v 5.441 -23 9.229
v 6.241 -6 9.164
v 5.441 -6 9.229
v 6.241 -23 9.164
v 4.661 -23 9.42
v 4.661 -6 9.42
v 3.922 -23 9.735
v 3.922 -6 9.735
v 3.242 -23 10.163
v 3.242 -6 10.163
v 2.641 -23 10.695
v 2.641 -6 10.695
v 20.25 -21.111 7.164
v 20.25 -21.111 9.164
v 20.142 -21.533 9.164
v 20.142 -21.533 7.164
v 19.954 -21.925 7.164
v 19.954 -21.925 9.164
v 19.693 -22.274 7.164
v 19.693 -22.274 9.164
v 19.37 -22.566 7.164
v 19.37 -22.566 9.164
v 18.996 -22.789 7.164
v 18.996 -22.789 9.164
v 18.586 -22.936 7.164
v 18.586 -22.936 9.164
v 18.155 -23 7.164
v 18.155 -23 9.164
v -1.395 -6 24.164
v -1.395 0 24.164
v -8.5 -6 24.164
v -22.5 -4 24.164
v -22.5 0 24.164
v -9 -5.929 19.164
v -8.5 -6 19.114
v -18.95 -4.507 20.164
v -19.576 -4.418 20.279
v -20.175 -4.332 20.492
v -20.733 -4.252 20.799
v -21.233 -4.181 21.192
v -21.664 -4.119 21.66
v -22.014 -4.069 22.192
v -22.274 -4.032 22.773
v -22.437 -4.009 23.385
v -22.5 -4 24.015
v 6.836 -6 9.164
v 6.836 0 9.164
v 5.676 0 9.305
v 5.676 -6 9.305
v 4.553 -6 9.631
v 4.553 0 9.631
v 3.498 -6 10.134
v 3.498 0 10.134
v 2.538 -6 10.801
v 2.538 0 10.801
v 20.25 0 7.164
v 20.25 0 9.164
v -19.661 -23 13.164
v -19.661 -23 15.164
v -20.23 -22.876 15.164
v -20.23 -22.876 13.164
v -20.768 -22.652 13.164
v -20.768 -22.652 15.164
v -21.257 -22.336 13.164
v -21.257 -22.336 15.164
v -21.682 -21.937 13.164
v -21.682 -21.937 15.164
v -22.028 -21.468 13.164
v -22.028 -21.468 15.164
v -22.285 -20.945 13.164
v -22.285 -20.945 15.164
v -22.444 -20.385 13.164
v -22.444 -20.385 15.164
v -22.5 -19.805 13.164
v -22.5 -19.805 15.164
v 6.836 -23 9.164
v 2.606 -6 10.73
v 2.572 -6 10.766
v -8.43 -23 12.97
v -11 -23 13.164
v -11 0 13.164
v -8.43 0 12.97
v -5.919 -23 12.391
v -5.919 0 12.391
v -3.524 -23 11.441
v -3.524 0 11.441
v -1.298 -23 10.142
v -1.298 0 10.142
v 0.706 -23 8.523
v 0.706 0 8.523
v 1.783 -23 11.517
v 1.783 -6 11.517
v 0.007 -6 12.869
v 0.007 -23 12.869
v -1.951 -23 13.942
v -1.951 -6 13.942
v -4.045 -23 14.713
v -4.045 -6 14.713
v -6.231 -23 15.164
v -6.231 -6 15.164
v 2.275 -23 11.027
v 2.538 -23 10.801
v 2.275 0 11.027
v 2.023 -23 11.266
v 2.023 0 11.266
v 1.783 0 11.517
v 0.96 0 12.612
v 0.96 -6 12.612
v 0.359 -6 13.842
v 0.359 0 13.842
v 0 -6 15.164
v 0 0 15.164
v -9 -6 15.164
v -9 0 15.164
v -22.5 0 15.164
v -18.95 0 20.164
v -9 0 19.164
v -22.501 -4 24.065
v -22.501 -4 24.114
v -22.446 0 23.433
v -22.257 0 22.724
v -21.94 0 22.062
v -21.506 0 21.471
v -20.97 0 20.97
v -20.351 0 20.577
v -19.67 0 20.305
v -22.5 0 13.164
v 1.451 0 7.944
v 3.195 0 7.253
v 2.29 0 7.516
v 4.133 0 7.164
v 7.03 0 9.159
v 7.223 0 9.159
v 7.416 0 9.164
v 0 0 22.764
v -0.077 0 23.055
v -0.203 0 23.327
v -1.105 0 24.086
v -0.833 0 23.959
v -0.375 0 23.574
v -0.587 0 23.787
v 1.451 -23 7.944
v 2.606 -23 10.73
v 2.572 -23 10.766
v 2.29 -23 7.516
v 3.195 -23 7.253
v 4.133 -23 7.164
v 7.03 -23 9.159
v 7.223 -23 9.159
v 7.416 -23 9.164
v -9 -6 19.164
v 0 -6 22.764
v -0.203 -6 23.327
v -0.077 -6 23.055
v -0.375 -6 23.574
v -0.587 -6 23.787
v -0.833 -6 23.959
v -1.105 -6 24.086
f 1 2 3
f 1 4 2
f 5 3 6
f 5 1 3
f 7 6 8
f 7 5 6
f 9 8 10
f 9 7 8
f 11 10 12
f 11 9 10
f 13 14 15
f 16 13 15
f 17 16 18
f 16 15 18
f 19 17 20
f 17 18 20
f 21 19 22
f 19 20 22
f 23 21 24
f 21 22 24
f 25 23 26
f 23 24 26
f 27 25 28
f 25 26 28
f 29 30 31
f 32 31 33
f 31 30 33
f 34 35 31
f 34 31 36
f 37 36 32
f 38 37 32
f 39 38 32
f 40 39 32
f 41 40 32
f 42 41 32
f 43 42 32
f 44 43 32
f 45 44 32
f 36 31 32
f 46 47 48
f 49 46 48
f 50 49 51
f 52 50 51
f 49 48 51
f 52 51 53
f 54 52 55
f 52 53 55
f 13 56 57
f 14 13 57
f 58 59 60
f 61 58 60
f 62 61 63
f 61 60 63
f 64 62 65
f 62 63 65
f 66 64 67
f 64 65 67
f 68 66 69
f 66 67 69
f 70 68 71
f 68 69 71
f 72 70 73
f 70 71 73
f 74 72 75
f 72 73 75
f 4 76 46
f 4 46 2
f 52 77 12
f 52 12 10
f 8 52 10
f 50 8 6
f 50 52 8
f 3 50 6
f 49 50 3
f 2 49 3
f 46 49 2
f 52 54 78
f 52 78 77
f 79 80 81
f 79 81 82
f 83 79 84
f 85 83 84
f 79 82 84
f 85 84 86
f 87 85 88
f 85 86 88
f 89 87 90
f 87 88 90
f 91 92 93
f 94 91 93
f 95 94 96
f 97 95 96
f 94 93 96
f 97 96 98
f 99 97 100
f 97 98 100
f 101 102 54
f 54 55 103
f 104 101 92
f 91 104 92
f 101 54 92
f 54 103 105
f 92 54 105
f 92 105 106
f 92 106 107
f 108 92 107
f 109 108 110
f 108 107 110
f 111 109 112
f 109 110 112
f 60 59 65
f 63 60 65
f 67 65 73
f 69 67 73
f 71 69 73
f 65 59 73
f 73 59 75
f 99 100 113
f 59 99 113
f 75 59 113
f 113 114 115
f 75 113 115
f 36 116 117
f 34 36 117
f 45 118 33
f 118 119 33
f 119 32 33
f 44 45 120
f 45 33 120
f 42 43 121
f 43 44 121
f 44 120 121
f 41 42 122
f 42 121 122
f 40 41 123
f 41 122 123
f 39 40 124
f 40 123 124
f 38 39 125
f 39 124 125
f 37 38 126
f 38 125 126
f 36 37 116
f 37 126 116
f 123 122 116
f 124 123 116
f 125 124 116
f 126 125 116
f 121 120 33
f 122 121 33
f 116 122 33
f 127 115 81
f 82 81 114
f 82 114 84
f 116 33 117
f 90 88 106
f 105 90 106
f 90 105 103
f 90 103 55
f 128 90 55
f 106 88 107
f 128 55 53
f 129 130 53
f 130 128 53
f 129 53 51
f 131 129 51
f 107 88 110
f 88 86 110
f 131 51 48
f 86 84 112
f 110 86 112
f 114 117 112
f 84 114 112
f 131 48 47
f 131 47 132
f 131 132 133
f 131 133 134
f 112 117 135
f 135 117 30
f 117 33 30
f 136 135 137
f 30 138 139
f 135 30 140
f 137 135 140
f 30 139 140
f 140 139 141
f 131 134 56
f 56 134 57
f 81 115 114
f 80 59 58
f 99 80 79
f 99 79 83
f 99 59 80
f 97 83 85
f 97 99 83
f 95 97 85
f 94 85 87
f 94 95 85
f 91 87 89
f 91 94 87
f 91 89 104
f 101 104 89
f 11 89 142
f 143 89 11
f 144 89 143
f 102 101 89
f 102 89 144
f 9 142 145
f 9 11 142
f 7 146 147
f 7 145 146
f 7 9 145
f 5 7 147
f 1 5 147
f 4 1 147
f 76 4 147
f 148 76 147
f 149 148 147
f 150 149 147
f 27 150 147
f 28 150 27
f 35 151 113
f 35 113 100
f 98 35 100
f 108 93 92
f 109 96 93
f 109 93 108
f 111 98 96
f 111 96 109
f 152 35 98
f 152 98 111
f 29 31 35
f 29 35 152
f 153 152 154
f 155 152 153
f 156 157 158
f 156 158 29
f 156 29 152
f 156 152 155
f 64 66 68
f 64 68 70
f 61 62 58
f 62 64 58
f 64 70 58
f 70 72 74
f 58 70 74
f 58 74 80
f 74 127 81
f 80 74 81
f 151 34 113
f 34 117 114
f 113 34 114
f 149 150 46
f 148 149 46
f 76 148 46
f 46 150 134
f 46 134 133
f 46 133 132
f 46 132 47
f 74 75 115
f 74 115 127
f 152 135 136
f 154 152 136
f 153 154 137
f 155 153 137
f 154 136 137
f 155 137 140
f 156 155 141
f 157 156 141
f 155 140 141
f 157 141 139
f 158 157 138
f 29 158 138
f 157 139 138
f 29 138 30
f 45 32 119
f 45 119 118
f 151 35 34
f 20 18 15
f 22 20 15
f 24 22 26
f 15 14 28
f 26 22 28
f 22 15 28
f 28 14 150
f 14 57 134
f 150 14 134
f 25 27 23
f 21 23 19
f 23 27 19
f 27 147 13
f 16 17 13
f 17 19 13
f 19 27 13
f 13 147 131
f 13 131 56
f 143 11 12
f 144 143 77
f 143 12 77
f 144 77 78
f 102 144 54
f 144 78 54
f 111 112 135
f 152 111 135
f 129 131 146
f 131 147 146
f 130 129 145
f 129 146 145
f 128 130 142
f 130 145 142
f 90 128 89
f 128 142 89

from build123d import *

# Parameters (mm, degrees)
F1_DEPTH  = 6
F2_DEPTH  = 23
F3_DEPTH  = 6
F4_R      = 5
F5_W      = 0.81186831
F5_H      = 2
F6_REACH  = 31.1431356237
F8_DEPTH  = 2
F10_DEPTH = 2
F11_R     = 5


with BuildPart() as f1:
    # F0 (on Front) → F1 (new body)
    with BuildSketch(Plane.XZ):
        with BuildLine():
            ThreePointArc((0, 22.7640915698), (-0.4760169509, 23.6848881741), (-1.3951592846, 24.1640915698))
            Line((-1.3951592846, 24.1640915698), (-22.5, 24.1640915698))
            ThreePointArc((-22.5, 24.1640915698), (-21.5061278282, 21.4707603394), (-18.9498743711, 20.1640915698))
            Line((-18.9498743711, 20.1640915698), (-9, 19.1640915698))
            Line((-9, 19.1640915698), (-9, 15.1640915698))
            Line((-9, 15.1640915698), (-6.2313233502, 15.1640915698))
            ThreePointArc((-6.2313233502, 15.1640915698), (-1.9506759829, 13.9418160027), (1.7829414728, 11.5173572715))
            ThreePointArc((1.7829414728, 11.5173572715), (0.6303147693, 13.2130414674), (0, 15.1640915698))
            Line((0, 15.1640915698), (0, 22.7640915698))
        make_face()
    extrude(amount=F1_DEPTH)

    # F0 (on Front) → F2 (join)
    with BuildSketch(Plane.XZ):
        with BuildLine():
            ThreePointArc((2.5376606134, 10.8007404291), (2.1473911285, 11.1454525194), (1.7829414728, 11.5173572715))
            ThreePointArc((1.7829414728, 11.5173572715), (-1.9506759829, 13.9418160027), (-6.2313233502, 15.1640915698))
            Line((-6.2313233502, 15.1640915698), (-9, 15.1640915698))
            Line((-9, 15.1640915698), (-22.5, 15.1640915698))
            Line((-22.5, 15.1640915698), (-22.5, 13.1640915698))
            Line((-22.5, 13.1640915698), (-11, 13.1640915698))
            ThreePointArc((-11, 13.1640915698), (-3.8410894684, 11.591731055), (2, 7.1640915698))
            Line((2, 7.1640915698), (20.2497988939, 7.1640915698))
            Line((20.2497988939, 7.1640915698), (20.2497988939, 9.1640915698))
            Line((20.2497988939, 9.1640915698), (7.4160159886, 9.1640915698))
            ThreePointArc((7.4160159886, 9.1640915698), (7.1261843392, 9.1582804924), (6.8363526899, 9.1640915698))
            Line((6.8363526899, 9.1640915698), (3.930054605, 9.1640915698))
            ThreePointArc((3.930054605, 9.1640915698), (3.2631933631, 10.0073736605), (2.5376606134, 10.8007404291))
        make_face()
    extrude(amount=F2_DEPTH)

    # F0 (on Front) → F3 (join)
    with BuildSketch(Plane.XZ):
        with BuildLine():
            ThreePointArc((6.8363526899, 9.1640915698), (4.5533954509, 9.6314834175), (2.5376606134, 10.8007404291))
            ThreePointArc((2.5376606134, 10.8007404291), (3.2631933631, 10.0073736605), (3.930054605, 9.1640915698))
            Line((3.930054605, 9.1640915698), (6.8363526899, 9.1640915698))
        make_face()
    extrude(amount=F3_DEPTH)

    # F4
    f4_edges = [f1.edges().sort_by_distance(p)[0] for p in [
        (3.930055, -14.5, 9.164092),
    ]]
    fillet(f4_edges, radius=F4_R)

    f6_end = Plane(origin=(-13.9749371855, -3, 19.6640915698), x_dir=(-0.9949874371, 0, 0.1), z_dir=(-0.1, 0, -0.9949874371))
    # F5 (on face) → F6 (cut, up to a plane its end follows)
    with BuildSketch(Plane.XY.offset(24.1640915698)):
        Polygon((-8.5, -6), (-22.5, -4), (-22.5, -6), align=None)
        with Locations((-22.905934155, -5)):
            Rectangle(F5_W, F5_H)
    f6_long = extrude(amount=-F6_REACH, mode=Mode.PRIVATE)
    add(split(f6_long, bisect_by=f6_end, keep=Keep.BOTTOM, mode=Mode.PRIVATE), mode=Mode.SUBTRACT)

    # F7 (on face) → F8 (cut, through all)
    with BuildSketch(Plane.XY.offset(15.1640915698)):
        with BuildLine():
            ThreePointArc((-19.6606274694, -23), (-21.6815784663, -21.9369160005), (-22.5, -19.8051147163))
            Line((-22.5, -19.8051147163), (-22.5, -23))
            Line((-22.5, -23), (-19.6606274694, -23))
        make_face()
    extrude(amount=-F8_DEPTH, mode=Mode.SUBTRACT)

    # F9 (on face) → F10 (cut, through all)
    with BuildSketch(Plane.XY.offset(9.1640915698)):
        with BuildLine():
            ThreePointArc((20.2497988939, -21.1107209325), (19.5387380379, -22.4279634054), (18.1554414653, -23))
            Line((18.1554414653, -23), (20.2497988939, -23))
            Line((20.2497988939, -23), (20.2497988939, -21.1107209325))
        make_face()
    extrude(amount=-F10_DEPTH, mode=Mode.SUBTRACT)

    # F11
    f11_edges = [f1.edges().sort_by_distance(p)[0] for p in [
        (2, -11.5, 7.164092),
    ]]
    fillet(f11_edges, radius=F11_R)


solid = f1.part
